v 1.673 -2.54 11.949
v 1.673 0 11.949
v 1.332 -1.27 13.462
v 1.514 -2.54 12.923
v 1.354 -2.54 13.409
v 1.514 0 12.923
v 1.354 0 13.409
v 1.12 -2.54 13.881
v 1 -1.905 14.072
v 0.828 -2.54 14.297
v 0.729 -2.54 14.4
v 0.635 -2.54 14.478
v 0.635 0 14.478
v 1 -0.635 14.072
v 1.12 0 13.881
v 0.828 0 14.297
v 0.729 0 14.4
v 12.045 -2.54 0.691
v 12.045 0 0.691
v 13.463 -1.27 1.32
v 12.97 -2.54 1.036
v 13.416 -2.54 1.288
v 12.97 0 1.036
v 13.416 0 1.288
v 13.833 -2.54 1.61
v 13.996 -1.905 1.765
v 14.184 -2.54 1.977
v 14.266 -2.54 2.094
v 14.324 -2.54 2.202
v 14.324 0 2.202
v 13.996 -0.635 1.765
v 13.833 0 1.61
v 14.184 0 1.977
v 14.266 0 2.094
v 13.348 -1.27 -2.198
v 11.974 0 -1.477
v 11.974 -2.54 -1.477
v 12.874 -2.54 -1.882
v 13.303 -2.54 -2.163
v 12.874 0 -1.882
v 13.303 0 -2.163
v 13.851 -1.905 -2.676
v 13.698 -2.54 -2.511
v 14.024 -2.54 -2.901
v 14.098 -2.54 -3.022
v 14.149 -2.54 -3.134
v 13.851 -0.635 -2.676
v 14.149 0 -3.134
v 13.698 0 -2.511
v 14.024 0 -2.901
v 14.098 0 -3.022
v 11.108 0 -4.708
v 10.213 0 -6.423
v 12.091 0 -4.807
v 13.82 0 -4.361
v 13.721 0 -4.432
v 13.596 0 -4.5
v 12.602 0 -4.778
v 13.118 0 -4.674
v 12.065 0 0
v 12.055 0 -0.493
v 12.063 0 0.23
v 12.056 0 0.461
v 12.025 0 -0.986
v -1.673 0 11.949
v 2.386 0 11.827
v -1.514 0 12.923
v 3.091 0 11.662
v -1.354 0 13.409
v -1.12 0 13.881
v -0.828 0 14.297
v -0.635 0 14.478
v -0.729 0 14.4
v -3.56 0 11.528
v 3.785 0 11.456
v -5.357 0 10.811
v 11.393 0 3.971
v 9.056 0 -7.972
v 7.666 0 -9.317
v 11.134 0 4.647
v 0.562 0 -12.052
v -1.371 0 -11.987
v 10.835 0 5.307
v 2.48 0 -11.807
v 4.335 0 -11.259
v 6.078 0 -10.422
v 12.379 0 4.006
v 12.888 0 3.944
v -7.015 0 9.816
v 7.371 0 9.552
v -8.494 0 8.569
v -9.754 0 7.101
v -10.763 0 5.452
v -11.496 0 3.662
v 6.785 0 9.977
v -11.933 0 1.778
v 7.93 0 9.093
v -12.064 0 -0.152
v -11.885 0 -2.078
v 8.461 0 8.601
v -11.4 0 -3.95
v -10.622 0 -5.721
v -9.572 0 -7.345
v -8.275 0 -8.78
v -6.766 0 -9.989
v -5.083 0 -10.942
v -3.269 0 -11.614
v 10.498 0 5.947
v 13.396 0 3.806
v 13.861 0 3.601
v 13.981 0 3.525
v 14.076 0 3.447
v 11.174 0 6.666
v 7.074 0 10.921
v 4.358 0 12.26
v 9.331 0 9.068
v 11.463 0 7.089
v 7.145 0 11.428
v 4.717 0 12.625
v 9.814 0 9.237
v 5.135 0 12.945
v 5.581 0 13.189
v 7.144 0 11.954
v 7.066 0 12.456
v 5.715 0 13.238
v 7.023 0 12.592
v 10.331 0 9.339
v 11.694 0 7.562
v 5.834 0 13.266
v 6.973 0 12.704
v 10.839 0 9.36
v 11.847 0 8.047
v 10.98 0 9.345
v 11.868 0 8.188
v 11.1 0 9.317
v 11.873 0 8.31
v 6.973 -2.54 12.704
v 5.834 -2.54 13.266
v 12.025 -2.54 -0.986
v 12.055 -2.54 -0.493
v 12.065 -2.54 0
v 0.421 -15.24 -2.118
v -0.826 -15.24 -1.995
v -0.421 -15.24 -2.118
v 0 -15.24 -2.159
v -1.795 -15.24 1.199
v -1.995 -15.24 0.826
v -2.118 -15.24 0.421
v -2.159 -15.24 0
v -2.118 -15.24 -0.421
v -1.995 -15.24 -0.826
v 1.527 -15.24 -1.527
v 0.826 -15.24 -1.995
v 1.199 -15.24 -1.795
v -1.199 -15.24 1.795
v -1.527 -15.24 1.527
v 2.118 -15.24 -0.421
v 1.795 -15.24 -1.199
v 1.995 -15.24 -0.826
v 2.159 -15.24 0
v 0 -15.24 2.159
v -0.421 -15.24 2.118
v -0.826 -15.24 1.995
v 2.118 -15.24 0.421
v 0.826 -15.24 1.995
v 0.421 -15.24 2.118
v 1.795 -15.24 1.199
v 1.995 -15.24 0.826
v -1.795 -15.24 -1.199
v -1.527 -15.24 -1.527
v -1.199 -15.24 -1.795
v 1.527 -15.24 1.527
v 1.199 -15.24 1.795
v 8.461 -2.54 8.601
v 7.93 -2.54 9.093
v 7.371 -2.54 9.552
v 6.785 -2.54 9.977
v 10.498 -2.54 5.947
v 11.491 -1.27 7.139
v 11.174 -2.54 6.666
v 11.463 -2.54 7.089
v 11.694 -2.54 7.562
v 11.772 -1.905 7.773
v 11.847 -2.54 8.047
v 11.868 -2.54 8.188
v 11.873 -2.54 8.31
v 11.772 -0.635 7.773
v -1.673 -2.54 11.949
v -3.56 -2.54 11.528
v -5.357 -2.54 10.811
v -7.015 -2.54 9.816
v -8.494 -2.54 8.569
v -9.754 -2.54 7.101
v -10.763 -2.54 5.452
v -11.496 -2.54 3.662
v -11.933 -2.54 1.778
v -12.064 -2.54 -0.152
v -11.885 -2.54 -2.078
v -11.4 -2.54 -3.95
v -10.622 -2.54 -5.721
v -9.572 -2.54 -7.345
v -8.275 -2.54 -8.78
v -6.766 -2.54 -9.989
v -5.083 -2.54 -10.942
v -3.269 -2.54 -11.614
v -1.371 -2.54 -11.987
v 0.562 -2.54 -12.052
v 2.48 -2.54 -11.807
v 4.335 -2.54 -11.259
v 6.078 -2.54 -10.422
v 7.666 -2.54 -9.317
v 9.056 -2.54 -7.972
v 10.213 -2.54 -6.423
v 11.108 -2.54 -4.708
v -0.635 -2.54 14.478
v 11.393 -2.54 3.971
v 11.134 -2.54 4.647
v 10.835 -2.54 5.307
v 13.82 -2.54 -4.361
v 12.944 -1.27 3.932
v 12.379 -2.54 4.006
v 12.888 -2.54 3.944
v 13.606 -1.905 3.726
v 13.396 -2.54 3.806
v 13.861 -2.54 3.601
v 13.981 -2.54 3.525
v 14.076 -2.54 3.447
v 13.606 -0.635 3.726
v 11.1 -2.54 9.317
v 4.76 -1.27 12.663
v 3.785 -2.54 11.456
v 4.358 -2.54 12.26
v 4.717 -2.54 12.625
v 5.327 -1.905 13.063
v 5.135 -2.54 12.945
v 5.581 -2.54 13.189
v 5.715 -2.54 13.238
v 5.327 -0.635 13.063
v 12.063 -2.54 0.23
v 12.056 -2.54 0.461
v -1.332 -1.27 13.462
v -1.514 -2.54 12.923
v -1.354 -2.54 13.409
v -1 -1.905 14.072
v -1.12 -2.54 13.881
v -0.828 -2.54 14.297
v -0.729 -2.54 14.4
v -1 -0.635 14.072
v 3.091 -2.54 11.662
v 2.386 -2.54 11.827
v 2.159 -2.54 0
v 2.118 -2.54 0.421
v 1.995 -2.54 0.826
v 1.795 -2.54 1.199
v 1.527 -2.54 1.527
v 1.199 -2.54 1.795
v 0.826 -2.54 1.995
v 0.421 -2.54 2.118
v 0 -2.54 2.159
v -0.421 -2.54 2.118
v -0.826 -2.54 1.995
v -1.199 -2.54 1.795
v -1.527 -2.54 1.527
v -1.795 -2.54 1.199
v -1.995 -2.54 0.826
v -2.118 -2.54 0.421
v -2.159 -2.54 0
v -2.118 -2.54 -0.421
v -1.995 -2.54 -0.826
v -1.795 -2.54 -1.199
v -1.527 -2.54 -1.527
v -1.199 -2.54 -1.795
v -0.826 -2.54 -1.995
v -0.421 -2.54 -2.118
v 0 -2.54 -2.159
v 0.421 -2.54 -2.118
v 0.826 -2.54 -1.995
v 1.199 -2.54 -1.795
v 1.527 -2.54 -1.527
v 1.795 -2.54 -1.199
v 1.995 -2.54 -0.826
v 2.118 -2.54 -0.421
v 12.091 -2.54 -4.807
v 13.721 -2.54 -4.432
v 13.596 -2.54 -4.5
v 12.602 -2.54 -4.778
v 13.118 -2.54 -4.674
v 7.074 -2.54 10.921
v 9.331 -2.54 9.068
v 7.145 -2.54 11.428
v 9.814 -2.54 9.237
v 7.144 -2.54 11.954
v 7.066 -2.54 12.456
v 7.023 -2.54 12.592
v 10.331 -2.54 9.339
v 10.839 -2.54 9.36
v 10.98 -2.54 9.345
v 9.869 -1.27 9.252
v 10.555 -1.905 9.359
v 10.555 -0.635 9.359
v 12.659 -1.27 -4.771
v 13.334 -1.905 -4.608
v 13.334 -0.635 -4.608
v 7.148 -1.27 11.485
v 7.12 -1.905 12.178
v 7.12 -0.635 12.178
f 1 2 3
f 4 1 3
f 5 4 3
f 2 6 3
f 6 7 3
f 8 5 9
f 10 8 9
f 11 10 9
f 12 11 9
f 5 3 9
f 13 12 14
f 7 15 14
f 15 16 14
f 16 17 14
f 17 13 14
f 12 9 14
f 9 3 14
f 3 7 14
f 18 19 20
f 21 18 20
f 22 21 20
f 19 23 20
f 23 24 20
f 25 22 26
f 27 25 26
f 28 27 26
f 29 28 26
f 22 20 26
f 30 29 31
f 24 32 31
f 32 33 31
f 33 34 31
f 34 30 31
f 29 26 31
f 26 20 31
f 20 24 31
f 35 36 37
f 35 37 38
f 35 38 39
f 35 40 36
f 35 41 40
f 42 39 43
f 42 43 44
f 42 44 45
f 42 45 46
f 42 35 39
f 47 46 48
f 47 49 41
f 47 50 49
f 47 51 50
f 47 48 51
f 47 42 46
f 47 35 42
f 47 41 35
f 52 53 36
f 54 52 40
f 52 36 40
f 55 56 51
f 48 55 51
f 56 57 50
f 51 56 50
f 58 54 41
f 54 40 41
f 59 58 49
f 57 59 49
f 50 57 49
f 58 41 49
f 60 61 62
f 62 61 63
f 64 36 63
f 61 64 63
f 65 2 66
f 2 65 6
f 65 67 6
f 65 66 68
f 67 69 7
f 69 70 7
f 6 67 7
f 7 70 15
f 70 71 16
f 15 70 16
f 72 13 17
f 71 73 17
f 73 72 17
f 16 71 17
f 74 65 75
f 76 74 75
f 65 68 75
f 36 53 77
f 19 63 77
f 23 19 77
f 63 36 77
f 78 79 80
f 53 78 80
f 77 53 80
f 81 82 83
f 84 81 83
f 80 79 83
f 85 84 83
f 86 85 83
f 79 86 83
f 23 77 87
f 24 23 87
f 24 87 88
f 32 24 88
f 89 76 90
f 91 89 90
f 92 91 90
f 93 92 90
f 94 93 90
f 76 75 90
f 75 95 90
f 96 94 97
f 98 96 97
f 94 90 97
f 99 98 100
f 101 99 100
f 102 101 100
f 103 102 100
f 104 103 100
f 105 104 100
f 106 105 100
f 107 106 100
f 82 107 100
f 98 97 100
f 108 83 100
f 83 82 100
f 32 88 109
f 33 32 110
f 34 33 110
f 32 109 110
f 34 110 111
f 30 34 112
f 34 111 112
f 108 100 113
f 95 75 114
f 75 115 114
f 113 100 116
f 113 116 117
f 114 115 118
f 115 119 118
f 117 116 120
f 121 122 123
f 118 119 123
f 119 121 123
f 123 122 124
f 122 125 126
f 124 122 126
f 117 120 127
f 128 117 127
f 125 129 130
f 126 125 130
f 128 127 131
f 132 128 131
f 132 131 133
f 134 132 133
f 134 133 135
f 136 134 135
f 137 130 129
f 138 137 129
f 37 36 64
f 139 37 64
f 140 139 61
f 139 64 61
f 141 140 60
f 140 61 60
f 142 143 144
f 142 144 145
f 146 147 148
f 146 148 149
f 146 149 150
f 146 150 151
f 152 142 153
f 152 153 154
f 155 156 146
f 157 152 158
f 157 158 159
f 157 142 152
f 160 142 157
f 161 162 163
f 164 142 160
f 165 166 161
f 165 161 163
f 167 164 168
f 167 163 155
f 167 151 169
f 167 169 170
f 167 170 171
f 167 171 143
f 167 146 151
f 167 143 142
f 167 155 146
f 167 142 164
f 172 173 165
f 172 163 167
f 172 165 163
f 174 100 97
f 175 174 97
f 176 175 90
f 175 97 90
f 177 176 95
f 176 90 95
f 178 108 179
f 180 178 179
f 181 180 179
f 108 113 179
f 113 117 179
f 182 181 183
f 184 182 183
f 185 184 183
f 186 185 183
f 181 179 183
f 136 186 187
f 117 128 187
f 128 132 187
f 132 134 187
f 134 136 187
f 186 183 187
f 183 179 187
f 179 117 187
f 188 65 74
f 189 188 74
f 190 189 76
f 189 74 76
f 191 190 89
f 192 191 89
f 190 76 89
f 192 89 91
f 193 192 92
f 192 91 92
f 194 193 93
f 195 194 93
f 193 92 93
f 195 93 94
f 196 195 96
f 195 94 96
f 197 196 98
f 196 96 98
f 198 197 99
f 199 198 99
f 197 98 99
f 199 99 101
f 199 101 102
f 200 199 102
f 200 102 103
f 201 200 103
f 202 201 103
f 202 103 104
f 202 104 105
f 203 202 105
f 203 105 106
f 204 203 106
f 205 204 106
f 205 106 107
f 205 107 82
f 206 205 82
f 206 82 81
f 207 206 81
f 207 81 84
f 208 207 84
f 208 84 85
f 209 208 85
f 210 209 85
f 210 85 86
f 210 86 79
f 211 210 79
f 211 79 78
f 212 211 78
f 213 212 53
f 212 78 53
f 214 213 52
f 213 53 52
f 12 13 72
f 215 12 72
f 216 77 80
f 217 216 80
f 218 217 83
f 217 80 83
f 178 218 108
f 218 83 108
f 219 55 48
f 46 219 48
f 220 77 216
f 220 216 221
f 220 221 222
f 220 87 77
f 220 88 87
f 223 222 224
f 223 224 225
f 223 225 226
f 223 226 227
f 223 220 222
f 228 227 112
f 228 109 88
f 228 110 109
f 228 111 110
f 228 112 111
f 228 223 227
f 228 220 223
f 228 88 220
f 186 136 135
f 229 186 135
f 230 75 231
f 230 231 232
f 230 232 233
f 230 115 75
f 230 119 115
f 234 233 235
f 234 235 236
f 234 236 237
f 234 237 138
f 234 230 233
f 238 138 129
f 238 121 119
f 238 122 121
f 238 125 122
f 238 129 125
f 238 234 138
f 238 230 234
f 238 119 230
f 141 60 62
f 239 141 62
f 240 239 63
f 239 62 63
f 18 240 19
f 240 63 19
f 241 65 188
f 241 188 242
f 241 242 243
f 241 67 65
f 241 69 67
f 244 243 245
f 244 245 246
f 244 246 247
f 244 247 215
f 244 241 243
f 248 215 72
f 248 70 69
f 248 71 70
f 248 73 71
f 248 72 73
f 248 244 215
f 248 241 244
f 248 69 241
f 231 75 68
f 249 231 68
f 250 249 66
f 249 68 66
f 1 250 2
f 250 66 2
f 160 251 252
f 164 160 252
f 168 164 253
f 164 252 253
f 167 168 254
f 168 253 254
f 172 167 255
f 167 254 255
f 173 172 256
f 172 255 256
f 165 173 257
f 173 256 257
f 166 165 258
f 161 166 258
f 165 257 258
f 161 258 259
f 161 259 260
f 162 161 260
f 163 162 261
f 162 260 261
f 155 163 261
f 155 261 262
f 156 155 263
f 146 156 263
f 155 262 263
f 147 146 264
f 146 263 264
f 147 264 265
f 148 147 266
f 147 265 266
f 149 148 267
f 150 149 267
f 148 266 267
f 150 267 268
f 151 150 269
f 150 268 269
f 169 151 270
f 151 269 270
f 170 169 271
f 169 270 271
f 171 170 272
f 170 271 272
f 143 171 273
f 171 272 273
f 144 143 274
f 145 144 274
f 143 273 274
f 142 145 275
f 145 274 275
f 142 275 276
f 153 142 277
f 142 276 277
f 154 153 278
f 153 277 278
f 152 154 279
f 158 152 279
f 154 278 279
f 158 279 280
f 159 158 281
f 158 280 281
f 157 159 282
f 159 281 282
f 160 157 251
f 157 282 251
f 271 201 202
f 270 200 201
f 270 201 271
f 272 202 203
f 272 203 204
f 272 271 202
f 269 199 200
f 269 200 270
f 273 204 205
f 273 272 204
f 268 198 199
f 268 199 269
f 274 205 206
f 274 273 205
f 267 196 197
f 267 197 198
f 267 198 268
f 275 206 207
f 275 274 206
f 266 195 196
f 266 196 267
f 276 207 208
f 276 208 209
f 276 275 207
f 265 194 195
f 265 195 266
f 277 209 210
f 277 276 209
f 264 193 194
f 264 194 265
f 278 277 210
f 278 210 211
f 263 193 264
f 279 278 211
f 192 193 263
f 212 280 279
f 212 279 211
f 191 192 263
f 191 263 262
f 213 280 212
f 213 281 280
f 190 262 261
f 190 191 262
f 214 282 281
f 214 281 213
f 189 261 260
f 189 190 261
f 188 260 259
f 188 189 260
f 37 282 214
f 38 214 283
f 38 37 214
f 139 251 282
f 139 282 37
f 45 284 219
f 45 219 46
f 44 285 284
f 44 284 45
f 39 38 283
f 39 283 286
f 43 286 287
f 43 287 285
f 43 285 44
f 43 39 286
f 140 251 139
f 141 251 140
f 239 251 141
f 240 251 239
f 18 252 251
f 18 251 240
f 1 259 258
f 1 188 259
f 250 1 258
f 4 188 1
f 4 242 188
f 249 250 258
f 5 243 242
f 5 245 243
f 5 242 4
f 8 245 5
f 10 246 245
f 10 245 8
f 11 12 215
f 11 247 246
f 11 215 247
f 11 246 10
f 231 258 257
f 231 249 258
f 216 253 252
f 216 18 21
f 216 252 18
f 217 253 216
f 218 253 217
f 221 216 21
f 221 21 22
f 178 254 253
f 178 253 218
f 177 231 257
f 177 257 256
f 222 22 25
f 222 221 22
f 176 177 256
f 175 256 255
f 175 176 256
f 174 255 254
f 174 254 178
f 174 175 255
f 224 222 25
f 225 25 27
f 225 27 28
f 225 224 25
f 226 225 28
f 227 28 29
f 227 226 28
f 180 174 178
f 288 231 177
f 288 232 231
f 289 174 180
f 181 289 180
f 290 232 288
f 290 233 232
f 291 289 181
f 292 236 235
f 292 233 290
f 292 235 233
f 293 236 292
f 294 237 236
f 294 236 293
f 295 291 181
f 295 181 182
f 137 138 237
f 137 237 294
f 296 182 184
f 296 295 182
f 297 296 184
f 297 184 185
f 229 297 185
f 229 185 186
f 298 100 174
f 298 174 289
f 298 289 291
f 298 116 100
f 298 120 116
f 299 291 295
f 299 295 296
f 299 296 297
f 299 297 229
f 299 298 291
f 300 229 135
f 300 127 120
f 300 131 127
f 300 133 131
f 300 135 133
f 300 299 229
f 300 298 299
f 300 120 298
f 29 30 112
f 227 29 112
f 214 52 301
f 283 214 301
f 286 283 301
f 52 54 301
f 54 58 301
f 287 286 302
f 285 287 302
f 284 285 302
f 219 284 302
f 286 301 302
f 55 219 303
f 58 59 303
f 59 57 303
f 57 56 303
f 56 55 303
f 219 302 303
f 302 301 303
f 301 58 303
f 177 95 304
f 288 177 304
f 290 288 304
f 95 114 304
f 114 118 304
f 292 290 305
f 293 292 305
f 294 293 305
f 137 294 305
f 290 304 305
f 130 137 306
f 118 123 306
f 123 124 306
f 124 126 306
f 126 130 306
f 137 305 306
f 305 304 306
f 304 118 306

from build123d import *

# Parameters (mm, degrees)
F1_DEPTH        = 2.54
F2_DEPTH        = 2.54
F2_COPIES_COUNT = 5
F2_COPIES_ANGLE = 105
F3_R            = 2.159
F4_DEPTH        = 12.7


# Not quite as in the source:
# - a pattern or mirror of a feature is missing from the dataset's text; its kind, count and spacing are read off the source's solid


with BuildPart() as f1:
    # F0 (on Front) → F1 (new body)
    with BuildSketch(Plane.XZ):
        with BuildLine():
            ThreePointArc((-1.6725612742, 11.9485046673), (-7.917852399, -9.1033970795), (12.065, 0))
            ThreePointArc((12.065, 0), (9.1033970795, 7.917852399), (1.6725612742, 11.9485046673))
            ThreePointArc((1.6725612742, 11.9485046673), (0, 12.065), (-1.6725612742, 11.9485046673))
        make_face()
    extrude(amount=F1_DEPTH)

    # F0 (on Front) → F2 (join, through all)
    with BuildSketch(Plane.XZ):
        with BuildLine():
            ThreePointArc((-1.6725612742, 11.9485046673), (0, 12.065), (1.6725612742, 11.9485046673))
            add(Edge.make_bspline(
                [(1.6725612742, 11.9485046673), (1.6184790505, 12.4941120183), (1.4671756256, 13.4121286243), (0.8625889567, 14.3194638744), (0.635, 14.478)],
                knots=[0, 0, 0, 0, 0.5287892811, 1, 1, 1, 1], degree=3))
            Line((0.635, 14.478), (-0.635, 14.478))
            add(Edge.make_bspline(
                [(-1.6725612742, 11.9485046673), (-1.6184790505, 12.4941120183), (-1.4671756256, 13.4121286243), (-0.8625889567, 14.3194638744), (-0.635, 14.478)],
                knots=[0, 0, 0, 0, 0.5287892811, 1, 1, 1, 1], degree=3))
        make_face()
    f2 = extrude(amount=F2_DEPTH)

    # F2_copies: F2 ×5 about axis
    f2_copies_axis = Axis((0, 0, 0), (0, 1, 0))
    for i in range(1, F2_COPIES_COUNT):
        add(f2.rotate(f2_copies_axis, i * F2_COPIES_ANGLE / (F2_COPIES_COUNT - 1)))

    # F3 (on face) → F4 (join)
    with BuildSketch(Plane.XZ.offset(2.54)):
        Circle(F3_R)
    extrude(amount=F4_DEPTH)


solid = f1.part
